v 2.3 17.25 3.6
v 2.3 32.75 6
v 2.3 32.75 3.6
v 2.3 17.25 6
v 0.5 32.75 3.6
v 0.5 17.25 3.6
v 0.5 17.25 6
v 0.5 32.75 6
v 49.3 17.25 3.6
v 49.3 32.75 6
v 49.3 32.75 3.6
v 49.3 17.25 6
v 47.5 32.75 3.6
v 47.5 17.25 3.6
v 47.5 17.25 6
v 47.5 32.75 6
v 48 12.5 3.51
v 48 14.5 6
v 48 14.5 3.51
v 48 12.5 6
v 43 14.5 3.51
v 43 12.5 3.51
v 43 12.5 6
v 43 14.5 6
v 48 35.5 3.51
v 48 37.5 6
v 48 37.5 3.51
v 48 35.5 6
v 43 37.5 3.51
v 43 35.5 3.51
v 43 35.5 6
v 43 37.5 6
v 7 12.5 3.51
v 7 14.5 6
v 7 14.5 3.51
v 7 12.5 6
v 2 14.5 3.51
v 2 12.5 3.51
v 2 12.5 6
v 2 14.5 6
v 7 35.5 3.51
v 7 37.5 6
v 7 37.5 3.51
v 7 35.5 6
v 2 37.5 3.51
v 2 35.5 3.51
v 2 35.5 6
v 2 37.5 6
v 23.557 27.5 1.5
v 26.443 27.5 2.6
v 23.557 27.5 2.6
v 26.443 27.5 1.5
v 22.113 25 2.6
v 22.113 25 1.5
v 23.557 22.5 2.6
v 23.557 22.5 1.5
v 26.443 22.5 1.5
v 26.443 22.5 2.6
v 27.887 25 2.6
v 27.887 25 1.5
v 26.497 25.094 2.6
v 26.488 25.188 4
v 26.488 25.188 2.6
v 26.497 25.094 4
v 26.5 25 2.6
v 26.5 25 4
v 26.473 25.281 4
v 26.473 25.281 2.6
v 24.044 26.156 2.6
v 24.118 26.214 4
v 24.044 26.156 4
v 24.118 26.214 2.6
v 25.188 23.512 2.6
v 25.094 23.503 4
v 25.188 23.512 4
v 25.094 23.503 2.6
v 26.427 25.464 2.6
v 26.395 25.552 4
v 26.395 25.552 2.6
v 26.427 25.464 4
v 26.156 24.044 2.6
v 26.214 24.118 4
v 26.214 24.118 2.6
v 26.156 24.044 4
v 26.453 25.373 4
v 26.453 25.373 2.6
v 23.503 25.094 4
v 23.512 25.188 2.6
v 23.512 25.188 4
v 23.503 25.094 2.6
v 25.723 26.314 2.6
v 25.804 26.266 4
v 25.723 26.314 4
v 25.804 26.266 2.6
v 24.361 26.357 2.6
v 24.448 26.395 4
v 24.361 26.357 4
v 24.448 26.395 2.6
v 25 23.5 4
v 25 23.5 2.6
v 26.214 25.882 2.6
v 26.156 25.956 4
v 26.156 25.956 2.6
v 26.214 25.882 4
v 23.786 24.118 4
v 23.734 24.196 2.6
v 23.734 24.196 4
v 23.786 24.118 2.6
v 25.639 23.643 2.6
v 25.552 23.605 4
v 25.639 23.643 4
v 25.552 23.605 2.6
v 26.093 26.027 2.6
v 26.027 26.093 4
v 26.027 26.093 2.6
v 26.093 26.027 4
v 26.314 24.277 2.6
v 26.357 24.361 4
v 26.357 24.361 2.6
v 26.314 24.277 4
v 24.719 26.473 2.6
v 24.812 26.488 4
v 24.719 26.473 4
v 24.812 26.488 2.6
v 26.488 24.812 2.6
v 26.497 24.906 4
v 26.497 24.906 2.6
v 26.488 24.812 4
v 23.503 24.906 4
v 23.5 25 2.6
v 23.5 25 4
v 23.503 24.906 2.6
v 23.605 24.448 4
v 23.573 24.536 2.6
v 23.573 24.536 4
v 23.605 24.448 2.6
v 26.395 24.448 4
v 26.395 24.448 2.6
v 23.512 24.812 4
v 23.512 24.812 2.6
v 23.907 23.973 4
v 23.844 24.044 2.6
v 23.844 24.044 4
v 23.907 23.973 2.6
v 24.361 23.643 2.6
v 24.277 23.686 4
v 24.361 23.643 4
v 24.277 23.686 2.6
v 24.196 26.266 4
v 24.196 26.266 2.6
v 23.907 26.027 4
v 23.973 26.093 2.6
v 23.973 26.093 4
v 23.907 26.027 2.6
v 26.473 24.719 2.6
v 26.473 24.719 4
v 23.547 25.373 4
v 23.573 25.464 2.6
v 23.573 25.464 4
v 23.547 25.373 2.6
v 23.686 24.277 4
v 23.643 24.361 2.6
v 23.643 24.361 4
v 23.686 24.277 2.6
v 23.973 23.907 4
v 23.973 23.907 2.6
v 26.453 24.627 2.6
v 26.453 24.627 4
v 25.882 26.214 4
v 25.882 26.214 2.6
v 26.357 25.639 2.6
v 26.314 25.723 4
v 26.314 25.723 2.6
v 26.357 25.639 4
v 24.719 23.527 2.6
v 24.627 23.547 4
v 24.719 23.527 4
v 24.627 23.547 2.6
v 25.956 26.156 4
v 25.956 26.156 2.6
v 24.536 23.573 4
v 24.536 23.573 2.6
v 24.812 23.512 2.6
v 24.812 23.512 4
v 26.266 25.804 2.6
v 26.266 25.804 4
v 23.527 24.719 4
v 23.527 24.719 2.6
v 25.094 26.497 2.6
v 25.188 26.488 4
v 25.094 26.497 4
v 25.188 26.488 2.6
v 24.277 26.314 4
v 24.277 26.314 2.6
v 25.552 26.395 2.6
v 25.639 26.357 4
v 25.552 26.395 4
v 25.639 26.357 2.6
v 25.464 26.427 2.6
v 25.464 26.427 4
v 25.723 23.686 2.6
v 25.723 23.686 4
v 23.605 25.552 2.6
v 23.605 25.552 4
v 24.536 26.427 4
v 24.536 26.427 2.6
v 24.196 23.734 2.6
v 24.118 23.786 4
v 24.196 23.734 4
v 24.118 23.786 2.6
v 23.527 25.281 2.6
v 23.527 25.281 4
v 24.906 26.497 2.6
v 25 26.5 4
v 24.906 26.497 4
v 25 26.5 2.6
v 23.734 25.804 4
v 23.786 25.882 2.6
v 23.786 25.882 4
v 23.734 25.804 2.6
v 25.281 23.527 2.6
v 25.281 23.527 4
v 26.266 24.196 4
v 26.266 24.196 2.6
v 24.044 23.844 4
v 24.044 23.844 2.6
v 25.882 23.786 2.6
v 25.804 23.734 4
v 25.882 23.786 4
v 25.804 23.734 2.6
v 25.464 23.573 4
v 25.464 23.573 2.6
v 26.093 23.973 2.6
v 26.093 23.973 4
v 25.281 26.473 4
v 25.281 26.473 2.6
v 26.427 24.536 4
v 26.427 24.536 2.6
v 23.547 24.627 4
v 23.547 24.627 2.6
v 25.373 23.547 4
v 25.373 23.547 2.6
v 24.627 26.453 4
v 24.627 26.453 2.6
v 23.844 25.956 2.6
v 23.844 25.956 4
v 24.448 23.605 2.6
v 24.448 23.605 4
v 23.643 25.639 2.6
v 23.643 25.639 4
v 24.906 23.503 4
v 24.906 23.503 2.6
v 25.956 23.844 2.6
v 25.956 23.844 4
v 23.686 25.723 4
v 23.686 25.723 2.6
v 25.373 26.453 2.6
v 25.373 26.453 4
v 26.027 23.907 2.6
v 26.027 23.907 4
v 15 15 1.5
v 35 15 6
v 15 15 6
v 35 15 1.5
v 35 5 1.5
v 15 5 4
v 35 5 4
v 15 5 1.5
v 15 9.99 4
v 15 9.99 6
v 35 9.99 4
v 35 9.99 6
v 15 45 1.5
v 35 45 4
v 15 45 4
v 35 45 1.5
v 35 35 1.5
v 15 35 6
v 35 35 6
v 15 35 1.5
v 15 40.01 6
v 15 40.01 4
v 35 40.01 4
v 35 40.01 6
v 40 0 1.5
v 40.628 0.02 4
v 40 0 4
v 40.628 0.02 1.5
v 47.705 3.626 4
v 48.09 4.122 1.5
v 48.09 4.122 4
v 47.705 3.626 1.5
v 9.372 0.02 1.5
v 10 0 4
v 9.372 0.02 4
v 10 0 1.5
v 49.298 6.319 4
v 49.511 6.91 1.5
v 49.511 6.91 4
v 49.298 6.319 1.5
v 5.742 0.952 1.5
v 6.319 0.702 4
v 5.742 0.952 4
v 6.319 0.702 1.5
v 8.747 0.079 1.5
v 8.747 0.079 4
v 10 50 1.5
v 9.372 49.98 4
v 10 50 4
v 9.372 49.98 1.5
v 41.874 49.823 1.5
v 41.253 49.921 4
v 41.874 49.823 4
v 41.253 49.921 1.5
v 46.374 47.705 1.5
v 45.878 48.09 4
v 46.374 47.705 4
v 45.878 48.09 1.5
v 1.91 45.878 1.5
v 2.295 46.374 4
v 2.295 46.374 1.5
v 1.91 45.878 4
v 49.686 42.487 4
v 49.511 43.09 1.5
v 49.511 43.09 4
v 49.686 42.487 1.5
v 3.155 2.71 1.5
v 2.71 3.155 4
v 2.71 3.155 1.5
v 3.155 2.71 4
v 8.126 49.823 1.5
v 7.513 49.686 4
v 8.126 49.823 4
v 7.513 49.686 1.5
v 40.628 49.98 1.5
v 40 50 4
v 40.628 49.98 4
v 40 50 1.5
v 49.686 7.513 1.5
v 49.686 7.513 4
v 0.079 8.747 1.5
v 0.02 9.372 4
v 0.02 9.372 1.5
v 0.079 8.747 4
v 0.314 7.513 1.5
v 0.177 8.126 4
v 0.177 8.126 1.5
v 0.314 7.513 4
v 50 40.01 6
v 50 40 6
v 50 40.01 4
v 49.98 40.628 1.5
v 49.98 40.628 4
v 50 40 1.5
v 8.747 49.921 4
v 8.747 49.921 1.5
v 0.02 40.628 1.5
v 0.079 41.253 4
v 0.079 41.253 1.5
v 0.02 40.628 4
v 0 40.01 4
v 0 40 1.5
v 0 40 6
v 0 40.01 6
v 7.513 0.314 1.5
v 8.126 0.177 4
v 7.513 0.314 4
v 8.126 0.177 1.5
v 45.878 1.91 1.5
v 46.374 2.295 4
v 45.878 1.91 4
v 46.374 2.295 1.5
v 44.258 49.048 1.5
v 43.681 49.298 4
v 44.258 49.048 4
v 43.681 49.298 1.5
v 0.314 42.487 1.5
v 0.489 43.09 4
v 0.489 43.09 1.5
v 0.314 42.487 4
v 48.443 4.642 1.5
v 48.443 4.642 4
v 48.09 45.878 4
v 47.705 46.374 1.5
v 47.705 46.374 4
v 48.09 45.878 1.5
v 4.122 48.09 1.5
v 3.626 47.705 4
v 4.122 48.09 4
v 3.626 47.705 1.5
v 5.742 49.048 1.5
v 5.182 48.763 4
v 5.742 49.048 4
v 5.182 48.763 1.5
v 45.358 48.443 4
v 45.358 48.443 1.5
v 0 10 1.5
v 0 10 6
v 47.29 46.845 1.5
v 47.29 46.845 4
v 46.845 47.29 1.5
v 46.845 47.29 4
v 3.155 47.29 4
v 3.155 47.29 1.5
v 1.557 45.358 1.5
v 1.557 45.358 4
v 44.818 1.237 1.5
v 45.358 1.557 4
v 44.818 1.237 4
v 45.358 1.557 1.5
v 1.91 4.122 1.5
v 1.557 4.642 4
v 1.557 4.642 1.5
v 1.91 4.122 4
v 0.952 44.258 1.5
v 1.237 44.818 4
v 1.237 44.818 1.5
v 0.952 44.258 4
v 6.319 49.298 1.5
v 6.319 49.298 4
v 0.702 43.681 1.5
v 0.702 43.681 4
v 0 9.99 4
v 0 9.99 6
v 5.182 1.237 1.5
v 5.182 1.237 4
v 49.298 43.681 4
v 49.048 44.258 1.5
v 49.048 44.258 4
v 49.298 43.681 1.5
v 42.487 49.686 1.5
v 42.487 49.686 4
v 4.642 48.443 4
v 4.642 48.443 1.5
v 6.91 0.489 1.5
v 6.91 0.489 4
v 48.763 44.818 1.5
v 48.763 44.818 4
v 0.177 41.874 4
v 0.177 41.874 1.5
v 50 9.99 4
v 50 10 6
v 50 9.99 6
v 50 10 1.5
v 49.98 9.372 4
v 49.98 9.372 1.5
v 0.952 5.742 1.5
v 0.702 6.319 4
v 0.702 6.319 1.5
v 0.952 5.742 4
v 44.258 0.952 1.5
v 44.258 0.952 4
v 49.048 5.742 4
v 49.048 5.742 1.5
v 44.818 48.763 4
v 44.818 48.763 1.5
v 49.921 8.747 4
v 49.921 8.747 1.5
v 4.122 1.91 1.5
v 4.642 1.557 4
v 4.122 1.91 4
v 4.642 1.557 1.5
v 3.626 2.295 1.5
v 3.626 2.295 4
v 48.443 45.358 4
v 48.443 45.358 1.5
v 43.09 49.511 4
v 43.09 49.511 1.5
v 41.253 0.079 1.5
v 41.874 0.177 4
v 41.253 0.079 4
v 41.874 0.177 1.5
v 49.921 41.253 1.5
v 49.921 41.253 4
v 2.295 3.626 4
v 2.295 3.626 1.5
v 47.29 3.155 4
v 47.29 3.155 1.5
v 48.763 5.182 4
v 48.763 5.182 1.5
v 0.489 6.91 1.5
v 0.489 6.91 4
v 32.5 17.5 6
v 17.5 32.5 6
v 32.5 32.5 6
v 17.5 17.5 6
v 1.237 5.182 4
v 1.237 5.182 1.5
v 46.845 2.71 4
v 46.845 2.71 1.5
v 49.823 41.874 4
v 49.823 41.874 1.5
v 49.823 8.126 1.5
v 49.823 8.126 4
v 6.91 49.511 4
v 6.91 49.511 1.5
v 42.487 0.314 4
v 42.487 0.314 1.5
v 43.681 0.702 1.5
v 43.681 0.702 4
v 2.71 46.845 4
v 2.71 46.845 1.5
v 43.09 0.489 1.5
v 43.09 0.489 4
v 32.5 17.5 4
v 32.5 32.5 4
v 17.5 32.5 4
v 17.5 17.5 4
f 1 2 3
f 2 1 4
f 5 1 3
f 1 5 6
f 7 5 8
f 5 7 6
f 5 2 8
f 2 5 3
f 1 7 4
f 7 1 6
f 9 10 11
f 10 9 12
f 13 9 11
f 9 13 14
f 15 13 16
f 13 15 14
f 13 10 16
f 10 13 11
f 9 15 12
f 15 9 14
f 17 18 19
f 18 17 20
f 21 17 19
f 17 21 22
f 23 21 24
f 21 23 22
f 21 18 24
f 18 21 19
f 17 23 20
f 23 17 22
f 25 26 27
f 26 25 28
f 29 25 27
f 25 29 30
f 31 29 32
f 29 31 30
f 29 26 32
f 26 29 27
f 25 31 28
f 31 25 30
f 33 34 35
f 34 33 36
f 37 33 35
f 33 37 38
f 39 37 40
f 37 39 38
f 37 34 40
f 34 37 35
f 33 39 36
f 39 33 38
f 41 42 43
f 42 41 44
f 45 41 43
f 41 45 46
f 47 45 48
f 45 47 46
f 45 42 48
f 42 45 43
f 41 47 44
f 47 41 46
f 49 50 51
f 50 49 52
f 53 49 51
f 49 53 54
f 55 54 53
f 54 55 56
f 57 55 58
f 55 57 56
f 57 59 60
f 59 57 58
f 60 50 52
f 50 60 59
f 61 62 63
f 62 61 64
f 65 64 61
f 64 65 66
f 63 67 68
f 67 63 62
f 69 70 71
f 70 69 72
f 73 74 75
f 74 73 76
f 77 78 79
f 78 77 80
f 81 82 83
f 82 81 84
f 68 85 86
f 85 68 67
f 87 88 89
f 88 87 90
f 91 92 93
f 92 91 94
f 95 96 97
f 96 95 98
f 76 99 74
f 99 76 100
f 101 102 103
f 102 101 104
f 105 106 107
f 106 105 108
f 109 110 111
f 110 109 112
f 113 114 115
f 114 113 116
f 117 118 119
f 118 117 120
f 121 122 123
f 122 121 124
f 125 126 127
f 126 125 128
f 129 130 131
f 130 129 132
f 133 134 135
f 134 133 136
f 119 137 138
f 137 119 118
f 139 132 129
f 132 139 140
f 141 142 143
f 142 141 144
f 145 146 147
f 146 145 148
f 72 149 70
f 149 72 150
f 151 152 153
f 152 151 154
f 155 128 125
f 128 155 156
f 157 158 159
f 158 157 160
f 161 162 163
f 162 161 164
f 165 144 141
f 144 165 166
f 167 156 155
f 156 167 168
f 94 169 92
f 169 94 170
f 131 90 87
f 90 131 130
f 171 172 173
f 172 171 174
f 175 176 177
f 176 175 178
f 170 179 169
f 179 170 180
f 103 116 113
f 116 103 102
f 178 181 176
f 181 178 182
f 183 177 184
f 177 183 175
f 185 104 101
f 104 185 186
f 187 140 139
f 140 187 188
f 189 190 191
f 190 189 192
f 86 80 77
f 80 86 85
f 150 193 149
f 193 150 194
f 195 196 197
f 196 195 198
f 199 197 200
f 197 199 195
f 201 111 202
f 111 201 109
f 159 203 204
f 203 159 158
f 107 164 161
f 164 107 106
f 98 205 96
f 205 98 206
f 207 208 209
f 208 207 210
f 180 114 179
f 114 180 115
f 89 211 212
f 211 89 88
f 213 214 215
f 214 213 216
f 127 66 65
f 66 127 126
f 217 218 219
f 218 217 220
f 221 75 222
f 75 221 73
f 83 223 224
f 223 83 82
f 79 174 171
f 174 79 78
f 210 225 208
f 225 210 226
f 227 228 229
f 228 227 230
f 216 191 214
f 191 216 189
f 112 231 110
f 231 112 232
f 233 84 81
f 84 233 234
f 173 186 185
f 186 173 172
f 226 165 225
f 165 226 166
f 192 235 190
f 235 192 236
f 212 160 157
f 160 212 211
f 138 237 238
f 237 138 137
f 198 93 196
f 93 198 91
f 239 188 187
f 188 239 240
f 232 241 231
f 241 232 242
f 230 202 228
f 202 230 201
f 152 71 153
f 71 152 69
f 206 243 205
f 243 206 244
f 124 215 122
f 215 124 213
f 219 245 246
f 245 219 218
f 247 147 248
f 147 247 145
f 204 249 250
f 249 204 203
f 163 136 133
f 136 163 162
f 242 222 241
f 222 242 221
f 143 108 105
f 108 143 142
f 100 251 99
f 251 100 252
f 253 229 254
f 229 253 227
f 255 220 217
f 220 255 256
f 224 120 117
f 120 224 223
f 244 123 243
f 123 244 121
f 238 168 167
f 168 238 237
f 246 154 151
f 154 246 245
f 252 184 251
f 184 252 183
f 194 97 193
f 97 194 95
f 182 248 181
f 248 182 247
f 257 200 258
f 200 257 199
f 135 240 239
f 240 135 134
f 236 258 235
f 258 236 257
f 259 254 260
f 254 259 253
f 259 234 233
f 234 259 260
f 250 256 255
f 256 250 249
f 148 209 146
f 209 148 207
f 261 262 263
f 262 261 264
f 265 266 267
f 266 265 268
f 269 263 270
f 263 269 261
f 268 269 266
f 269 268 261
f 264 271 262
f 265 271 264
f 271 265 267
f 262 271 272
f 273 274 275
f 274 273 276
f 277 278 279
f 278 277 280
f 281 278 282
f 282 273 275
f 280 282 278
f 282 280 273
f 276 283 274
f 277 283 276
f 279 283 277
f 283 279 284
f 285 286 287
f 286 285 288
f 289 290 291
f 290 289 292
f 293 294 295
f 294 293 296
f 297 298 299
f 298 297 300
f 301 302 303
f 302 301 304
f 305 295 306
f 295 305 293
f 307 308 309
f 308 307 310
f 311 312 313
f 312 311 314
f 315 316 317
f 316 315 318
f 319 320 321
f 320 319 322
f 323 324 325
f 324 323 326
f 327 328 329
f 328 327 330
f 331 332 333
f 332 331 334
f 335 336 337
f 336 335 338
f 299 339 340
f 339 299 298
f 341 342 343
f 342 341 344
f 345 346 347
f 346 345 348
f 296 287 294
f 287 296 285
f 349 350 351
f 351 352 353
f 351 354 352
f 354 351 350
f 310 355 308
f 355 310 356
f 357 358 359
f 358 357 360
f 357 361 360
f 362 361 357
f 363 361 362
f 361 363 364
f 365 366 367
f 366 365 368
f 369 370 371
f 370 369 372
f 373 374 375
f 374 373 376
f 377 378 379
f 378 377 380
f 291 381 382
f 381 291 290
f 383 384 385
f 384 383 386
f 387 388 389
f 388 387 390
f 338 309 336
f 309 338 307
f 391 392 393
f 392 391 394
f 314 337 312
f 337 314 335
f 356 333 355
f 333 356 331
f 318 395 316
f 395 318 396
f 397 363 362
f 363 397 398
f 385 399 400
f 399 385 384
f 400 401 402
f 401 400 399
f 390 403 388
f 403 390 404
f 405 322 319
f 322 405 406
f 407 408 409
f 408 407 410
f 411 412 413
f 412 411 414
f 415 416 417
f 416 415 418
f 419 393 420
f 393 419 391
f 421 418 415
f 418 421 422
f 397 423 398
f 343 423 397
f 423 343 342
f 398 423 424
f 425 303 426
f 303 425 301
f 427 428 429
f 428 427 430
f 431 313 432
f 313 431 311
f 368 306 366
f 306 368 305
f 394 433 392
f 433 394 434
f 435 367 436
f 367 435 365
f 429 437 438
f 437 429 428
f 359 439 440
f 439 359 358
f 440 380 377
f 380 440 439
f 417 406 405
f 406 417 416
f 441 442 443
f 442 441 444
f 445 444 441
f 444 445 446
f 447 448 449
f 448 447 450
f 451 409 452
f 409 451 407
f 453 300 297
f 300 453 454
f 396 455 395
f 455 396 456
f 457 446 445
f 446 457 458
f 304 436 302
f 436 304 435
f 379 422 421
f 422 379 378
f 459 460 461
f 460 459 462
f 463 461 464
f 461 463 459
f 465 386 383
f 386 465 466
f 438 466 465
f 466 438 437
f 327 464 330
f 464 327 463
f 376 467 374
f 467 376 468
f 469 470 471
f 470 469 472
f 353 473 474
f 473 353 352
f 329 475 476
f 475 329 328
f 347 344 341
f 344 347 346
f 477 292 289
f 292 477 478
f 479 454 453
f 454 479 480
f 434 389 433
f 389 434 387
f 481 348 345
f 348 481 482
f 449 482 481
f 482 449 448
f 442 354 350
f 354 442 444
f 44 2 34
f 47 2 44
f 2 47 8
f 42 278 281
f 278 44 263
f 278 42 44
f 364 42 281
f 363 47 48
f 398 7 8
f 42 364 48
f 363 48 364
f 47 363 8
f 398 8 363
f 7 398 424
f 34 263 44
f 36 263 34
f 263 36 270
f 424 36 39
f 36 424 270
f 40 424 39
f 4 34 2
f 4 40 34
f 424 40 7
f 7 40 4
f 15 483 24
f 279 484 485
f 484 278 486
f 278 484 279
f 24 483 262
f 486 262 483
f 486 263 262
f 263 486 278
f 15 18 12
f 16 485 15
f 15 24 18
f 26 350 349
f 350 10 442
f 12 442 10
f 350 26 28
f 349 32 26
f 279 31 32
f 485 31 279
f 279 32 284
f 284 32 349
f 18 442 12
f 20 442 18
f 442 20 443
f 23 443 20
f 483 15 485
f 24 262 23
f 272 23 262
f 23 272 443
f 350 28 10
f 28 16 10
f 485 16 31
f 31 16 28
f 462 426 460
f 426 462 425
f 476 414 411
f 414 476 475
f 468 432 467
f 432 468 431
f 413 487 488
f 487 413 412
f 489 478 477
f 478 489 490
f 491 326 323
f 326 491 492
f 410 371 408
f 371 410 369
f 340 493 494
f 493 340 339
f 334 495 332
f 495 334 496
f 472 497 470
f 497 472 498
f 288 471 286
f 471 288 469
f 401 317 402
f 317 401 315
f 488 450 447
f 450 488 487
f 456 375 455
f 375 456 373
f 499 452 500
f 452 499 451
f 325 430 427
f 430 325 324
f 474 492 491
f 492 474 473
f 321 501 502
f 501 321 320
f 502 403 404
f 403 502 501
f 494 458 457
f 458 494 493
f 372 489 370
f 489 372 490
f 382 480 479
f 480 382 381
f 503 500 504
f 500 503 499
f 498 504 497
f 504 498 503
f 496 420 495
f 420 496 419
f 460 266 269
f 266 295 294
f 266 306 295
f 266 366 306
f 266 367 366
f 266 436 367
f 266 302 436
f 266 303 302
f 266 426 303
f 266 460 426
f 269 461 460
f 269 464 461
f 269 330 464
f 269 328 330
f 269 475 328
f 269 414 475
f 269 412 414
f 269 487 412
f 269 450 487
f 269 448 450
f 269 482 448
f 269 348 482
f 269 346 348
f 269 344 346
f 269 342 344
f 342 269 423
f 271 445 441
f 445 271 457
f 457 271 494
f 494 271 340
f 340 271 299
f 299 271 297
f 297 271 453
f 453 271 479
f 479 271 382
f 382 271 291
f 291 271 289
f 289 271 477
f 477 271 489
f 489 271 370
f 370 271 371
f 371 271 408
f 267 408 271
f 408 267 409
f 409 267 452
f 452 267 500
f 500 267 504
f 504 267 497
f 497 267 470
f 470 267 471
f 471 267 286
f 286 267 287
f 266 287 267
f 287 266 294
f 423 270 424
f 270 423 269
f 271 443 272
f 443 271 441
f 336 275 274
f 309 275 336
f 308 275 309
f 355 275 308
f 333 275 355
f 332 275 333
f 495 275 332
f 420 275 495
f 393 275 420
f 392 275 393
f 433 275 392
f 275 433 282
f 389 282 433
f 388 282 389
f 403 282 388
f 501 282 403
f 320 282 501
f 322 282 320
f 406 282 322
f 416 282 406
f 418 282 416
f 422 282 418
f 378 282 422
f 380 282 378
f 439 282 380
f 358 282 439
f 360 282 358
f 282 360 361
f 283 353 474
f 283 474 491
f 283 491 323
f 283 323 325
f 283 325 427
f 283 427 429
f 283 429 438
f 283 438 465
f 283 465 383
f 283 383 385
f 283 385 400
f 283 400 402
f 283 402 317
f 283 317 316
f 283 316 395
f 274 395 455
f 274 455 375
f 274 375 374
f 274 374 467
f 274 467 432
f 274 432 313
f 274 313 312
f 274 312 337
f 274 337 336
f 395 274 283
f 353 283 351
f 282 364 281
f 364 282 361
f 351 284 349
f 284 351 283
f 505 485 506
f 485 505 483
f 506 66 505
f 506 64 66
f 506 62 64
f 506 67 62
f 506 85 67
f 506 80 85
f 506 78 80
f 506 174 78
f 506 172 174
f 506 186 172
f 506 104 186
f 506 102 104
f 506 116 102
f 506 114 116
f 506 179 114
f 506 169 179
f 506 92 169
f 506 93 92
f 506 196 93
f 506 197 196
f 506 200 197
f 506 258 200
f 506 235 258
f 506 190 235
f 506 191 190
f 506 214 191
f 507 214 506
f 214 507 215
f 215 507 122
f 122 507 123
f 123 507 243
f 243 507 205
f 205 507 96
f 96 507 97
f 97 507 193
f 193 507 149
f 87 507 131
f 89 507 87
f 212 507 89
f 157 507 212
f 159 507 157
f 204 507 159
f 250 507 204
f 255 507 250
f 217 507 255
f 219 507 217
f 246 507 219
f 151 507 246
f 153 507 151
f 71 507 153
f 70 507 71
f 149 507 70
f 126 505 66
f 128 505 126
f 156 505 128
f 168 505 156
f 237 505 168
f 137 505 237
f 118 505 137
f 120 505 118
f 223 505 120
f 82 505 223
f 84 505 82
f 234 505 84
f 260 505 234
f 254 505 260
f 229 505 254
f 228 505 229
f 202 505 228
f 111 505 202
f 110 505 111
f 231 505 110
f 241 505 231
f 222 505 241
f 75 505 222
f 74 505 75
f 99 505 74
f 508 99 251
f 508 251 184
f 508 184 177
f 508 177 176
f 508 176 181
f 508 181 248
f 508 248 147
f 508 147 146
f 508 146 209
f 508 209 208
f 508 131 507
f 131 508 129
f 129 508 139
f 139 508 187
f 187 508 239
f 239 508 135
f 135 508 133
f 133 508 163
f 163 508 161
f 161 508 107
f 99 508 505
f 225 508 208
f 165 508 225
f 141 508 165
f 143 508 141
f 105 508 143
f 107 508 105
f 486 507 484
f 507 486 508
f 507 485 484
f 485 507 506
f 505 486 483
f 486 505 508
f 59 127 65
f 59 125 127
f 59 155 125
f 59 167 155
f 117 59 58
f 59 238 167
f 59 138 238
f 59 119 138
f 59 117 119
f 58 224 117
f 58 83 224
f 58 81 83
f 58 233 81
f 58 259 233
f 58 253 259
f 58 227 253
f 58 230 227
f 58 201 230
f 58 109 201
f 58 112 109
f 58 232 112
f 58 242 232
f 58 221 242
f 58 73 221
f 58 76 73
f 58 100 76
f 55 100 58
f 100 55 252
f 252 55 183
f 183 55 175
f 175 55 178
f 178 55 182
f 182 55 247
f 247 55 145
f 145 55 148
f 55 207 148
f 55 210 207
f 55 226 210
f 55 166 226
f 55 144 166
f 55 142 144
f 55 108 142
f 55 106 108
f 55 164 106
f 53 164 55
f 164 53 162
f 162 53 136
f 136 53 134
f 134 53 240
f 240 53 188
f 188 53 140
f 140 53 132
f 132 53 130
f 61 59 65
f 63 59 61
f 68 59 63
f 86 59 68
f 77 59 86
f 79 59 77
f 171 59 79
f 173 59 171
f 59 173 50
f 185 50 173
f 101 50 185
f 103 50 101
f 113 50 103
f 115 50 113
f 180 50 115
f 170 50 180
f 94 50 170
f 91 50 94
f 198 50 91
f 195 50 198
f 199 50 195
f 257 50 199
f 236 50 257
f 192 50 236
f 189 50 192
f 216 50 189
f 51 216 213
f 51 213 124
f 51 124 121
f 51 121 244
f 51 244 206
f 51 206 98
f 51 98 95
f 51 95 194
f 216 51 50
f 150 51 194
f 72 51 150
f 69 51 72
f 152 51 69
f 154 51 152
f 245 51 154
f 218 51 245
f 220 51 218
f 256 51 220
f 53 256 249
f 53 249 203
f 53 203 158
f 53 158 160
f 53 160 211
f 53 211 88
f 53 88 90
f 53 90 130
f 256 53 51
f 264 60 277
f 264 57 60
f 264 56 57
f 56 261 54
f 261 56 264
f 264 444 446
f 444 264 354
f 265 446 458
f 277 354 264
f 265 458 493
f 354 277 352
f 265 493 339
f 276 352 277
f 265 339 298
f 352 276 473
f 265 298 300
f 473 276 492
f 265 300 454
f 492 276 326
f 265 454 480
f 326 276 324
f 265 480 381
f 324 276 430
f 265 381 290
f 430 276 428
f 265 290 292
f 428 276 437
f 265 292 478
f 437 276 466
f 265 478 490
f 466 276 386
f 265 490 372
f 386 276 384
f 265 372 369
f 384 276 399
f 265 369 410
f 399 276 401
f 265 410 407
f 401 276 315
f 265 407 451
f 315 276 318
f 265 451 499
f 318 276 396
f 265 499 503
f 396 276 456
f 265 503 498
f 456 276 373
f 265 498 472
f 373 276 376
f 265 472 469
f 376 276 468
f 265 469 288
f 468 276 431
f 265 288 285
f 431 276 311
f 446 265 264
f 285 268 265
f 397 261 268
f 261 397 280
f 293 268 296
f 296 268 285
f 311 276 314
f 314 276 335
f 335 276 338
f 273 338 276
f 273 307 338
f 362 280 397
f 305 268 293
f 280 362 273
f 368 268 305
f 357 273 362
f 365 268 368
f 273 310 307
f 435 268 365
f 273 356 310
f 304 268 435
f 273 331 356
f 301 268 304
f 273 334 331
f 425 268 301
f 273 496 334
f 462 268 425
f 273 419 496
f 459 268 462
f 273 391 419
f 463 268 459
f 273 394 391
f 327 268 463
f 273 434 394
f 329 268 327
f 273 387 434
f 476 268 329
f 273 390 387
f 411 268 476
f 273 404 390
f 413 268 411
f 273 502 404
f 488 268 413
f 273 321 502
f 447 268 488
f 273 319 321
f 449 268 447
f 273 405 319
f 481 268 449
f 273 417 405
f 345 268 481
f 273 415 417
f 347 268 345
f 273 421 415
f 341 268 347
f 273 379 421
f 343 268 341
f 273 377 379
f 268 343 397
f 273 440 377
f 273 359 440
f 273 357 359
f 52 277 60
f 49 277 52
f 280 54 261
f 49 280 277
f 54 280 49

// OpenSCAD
// file: backplate_v1.scad
use <./parts.scad>

module backplate() {
    difference() {
        linear_extrude(height=6)
            rounded_rectangle(50, 50, 10, fn=100);

        translate([.5,0,0])
        translate([0,50/2-15.5/2,0.1])
        translate([0,0,3.5]) {
            cube([1.8, 15.5, 2.5], center=false);

            translate([47,0,0])
                cube([1.8, 15.5, 2.5], center=false);
        }


        translate([2,12.5,0])
            translate([0,0,3.51]) {
                {
                    cube([5, 2,2.5], center=false);

                    translate([0, 23, 0])
                        cube([5, 2, 2.5], center=false);
                }

                translate([41,0,0])
                    {
                        cube([5, 2,2.5], center=false);

                        translate([0, 23, 0])
                            cube([5, 2, 2.5], center=false);
                    }
            }

        translate([0,-0.01,4])
            cube([50, 10, 5], center=false);

        translate([0,40.01,4])
            cube([50, 10, 5], center=false);

        {
            translate([25,25,-.5]) {
                hexHole(flatToFlatDistance = M2_5(), depth=2.5);
                cylinder(d=3, h=50, center=false, $fn=100);
            }
        }

        translate([25,25,7.5 - 1])
            cube([15, 15, 5], center=true);


        translate([25, 10, 3.51]) {
            rotate([0,0,90])
                cube([10, 20, 5], center=true);

            translate([0,30,0])
                rotate([0,0,90])
                    cube([10, 20, 5], center=true);
        }
    }
}
backplate();
// file: parts.scad
Mtolerance = 0.1;
M5size = 7.8;
M2_5size = 4.9;

function M5() = M5size + Mtolerance;

function M2_5() = M2_5size + Mtolerance;

module hexHole(flatToFlatDistance, depth) {
    previewOptimize = 0.1;
    hexagonSide = flatToFlatDistance / (cos(30) * 2);

    translate([0, 0, -previewOptimize]) {
        linear_extrude(height=depth + previewOptimize * 2, center=false) {
            polygon(points=[
                    [hexagonSide, 0],
                    [hexagonSide / 2, sqrt(3) * hexagonSide / 2],
                    [-hexagonSide / 2, sqrt(3) * hexagonSide / 2],
                    [-hexagonSide, 0],
                    [-hexagonSide / 2, -sqrt(3) * hexagonSide / 2],
                    [hexagonSide / 2, -sqrt(3) * hexagonSide / 2]
                ]);
        }
    }
}

// Rounded rectangle module
module rounded_rectangle(width, height, r, fn=64) {
    // ensure radius doesn't exceed half of width/height
    rr = min(r, width/2, height/2);

    translate([rr, rr])
        offset(r=rr, $fn=fn)
            square([width - 2*rr, height - 2*rr]);

}
// main file
use <./parts.scad>
use <./backplate_v1.scad>

difference() {
    backplate();

    cube([200, 200, 3], center=true);

    translate([25,25,0]) {
        hexHole(flatToFlatDistance = M2_5(), depth=2.5);
        cylinder(d=3, h=60, center=false, $fn=100);
    }
}
